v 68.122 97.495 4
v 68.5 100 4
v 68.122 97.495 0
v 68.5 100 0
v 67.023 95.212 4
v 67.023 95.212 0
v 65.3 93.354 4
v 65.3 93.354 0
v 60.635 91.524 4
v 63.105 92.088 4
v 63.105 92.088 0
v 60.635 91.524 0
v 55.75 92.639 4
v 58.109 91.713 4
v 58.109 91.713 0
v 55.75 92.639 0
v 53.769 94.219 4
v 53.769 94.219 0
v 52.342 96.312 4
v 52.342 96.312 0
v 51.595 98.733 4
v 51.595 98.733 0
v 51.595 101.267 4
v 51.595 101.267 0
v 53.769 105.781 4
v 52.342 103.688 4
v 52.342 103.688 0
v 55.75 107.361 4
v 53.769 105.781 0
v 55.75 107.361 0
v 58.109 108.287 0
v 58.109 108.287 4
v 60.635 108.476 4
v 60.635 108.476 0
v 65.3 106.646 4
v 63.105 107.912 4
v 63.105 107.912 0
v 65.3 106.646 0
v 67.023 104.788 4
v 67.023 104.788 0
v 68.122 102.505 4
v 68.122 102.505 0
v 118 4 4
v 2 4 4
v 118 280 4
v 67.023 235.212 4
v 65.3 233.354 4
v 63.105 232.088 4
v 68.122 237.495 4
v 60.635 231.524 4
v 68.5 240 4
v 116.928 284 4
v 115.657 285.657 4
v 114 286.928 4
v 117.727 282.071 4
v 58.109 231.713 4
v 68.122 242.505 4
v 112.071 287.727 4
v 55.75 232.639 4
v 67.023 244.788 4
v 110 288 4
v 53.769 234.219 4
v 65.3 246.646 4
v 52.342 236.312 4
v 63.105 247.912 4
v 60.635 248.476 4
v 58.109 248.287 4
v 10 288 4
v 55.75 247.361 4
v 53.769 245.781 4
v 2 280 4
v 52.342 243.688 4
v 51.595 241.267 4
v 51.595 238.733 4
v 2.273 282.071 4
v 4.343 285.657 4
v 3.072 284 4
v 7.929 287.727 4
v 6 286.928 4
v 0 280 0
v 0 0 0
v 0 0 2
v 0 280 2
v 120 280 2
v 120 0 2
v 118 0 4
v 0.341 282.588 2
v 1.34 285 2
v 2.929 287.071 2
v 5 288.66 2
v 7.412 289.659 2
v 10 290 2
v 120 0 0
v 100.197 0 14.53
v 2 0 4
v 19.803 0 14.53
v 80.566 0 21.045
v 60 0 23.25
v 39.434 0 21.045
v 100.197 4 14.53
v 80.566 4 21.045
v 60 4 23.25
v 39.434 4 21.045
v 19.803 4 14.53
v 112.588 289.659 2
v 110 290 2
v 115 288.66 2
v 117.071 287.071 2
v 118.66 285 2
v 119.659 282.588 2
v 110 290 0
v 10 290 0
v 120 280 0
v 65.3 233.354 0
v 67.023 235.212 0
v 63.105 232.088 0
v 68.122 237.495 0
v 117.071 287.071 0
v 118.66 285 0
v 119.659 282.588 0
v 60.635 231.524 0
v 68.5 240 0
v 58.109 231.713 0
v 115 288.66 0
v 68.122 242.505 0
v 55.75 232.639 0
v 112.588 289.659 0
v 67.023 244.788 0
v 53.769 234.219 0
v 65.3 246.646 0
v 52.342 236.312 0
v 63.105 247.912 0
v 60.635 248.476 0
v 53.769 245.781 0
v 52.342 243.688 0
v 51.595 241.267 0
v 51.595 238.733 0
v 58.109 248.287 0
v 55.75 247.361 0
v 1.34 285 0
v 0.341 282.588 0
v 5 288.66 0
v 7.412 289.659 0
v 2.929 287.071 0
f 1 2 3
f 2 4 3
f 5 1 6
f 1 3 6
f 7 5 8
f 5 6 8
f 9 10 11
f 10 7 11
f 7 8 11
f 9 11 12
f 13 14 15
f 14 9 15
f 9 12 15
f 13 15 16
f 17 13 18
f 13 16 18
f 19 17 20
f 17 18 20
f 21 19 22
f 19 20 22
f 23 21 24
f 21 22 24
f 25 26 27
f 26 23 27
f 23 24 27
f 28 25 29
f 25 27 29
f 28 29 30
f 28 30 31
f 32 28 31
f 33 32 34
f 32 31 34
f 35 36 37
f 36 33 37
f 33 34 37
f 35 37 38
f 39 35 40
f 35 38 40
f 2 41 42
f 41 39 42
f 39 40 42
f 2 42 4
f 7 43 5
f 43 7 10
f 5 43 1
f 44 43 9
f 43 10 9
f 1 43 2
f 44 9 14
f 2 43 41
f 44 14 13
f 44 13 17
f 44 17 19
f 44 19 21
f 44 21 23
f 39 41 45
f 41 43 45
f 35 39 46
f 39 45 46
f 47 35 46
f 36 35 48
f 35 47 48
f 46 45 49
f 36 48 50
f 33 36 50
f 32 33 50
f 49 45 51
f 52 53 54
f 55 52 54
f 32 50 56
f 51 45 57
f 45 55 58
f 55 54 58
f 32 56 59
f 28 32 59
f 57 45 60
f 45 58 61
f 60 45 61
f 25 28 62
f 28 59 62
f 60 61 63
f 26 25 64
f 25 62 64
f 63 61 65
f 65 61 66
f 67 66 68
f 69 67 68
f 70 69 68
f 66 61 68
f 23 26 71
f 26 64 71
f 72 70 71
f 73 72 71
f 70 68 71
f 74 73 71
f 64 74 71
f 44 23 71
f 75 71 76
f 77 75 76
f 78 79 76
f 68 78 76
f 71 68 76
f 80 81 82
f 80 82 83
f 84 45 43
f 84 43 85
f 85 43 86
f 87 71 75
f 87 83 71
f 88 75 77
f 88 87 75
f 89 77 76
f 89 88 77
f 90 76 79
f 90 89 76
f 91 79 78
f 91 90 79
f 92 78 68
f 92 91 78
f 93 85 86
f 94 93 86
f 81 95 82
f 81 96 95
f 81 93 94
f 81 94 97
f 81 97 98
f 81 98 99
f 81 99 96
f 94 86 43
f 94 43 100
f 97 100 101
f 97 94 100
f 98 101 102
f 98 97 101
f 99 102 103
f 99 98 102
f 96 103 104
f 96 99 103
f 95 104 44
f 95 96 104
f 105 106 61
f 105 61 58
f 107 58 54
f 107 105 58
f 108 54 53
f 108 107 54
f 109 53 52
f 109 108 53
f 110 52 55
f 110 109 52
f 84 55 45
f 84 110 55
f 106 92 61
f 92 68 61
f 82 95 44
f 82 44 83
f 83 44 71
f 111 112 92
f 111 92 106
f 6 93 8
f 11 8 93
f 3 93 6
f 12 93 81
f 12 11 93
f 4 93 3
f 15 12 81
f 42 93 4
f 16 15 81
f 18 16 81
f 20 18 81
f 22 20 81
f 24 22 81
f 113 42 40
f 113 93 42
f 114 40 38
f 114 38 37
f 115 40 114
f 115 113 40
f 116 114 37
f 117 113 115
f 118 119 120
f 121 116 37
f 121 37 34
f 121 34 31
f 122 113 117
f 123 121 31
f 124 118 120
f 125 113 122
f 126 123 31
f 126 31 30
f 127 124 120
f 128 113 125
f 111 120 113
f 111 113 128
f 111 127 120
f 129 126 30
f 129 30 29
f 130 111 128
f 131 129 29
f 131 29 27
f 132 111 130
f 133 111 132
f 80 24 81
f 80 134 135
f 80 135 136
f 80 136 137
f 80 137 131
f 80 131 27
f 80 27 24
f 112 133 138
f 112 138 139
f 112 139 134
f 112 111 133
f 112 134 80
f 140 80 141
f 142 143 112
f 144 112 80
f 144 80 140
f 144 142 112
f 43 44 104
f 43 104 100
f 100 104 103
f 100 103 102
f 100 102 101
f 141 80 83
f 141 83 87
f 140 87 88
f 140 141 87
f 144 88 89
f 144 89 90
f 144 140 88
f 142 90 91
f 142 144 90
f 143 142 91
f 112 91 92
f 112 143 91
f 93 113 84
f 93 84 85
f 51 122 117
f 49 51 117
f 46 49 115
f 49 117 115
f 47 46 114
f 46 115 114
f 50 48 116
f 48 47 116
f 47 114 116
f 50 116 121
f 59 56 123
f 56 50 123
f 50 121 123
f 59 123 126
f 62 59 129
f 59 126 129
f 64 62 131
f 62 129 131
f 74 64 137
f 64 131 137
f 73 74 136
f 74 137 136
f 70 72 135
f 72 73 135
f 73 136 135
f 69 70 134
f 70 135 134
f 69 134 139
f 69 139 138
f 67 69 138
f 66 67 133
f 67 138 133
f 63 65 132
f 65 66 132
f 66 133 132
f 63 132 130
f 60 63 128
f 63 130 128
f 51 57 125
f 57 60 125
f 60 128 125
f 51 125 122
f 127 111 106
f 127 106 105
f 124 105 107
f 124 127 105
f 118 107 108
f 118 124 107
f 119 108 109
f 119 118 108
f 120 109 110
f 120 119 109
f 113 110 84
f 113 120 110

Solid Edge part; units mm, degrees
sketch "Sketch1" plane through (0, 0, 0) normal (0, 0, 1) x (1, 0, 0)
  circle A0 centre (60, 240) radius 8.5
  line L0 (120, 280) -> (120, 0)
  line L1 (120, 0) -> (0, 0)
  line L2 (0, 0) -> (0, 280)
  arc A1 (10, 290) -> (0, 280) centre (10, 280) ccw
  line L3 (10, 290) -> (110, 290)
  arc A2 (120, 280) -> (110, 290) centre (110, 280) ccw
  circle A3 centre (60, 100) radius 8.5
  dimension "D1" = 100
  dimension "D2" = 280
  dimension "D3" = 50
  dimension "D4" = 190
  dimension "D5" = 60
  dimension "D6" = 17
  dimension "D7" = 17
  dimension "D8" = 10
extrude "Protrusion1" add sketch "Sketch1" along normal blind 4
chamfer "Chaflán_1" distance 2 angle 45 5 edges at (0, 140, 4) (2.9289, 287.0711, 4) (60, 290, 4) (117.0711, 287.0711, 4) (120, 140, 4)
sketch "Sketch2" plane through (0, 0, 0) normal (0, 1, 0) x (-1, 0, 0)
  line L0 (-118, 4) -> (-2, 4)
  arc A0 (-2, 4) -> (-118, 4) centre (-60, -73.7496) ccw
extrude "ProtrusiónExtruida_4" add sketch "Sketch2" along normal blind 4
